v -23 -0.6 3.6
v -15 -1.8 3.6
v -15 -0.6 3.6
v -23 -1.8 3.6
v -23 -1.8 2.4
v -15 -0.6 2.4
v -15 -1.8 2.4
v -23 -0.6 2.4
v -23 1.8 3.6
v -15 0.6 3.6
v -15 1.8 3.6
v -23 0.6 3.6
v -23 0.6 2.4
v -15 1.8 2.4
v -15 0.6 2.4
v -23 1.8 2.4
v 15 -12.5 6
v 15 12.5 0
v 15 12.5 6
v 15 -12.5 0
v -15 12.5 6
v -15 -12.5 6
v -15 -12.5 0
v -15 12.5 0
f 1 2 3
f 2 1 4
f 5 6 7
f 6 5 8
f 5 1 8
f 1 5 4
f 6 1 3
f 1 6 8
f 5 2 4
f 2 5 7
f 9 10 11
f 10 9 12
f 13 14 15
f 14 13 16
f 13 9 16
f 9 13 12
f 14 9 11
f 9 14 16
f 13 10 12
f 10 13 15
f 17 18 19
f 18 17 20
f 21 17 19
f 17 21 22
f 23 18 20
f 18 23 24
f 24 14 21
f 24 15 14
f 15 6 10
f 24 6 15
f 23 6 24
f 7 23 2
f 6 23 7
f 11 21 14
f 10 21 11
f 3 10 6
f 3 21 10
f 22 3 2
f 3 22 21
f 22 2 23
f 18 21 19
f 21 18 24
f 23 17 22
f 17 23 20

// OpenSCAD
// file: ../lipo-cradle.scad
//-----------------------------------------------------------------------
// LiPo pouch cell, in a low open cradle on the floor
//
// A low wall round the pack's footprint, with a gap on one side for the
// lead. The pack drops in and the lid (or a strap) keeps it down. Optional
// strap bars on the two long sides take a hook-and-loop strap over the pack:
// the strap goes down outside the wall, under the bar, and back up.
//
// Modules, all in the same frame:
//   lipoGhost()    the pack, for previews
//   lipoCradle()   the plastic: wall, lead gap, optional strap bars
//   lipoBody()     the pack as a plain solid (views, collision checks)
//
// Frame: origin on the floor top, at the centre of the pack's footprint.
// X along the pack's length (the tab and lead at -X), Y across its width,
// Z up. Units: mm.
//
// Sizes: the pouch code on the label, TTWWLL = thickness in tenths of a mm,
// width, length in whole mm (602530 = 6.0 x 25 x 30). Named packs are in
// lipoPacks; lipoCodeDims("503035") decodes any other code. Codes are the
// CELL: a pack with its protection board folded at the tab end is a few mm
// longer, and pouches swell, so measure the pack and use the allowances.
//
// Use with `use <.../components/lipo-cradle/lipo-cradle.scad>`.
//-----------------------------------------------------------------------

//-- [name, thickness, width, length, note]. The cell sizes from the code, except where measured
lipoPacks = [
  ["402030",  4.0, 20, 30, ""],
  ["502030",  5.0, 20, 30, ""],
  ["602530",  6.0, 25, 30, "500 mAh in use, controller project (label read 2026-10-30)"],
  ["503035",  5.0, 30, 35, ""],
  ["403048",  4.0, 30, 48, ""],
  ["603048",  6.0, 30, 48, ""],
  ["503450",  5.0, 34, 50, ""],
  ["603450",  6.0, 34, 50, ""],
  ["103450", 10.0, 34, 50, "the 10 is whole mm: 1800-2000 mAh"],
  ["902030",  9.0, 20, 30, ""],
  ["605060",  6.0, 50, 60, ""],
  ["803860",  8.0, 38, 60, "2000 mAh class"],
  ["PKCell-2000", 8.0, 38, 60, "Pi Hut 105187, 2000 mAh, vendor size; lead 100, JST-PH"],
];

//-- decode a six-digit code: TT in tenths of a mm (20 and up), WW, LL in mm.
//-- Codes starting with 1 (10-19) are ambiguous (103450 is 10 mm thick): put them in lipoPacks
function lipoCodeDims(code) =
  let (d = [for (c = code) ord(c) - 48],
       t = d[0]*10 + d[1])
  assert(len(code) == 6 && min(d) >= 0 && max(d) <= 9, str("not a six-digit pouch code: ", code))
  assert(t >= 20, str("ambiguous thickness in ", code, ": add it to lipoPacks"))
  [t/10, d[2]*10 + d[3], d[4]*10 + d[5]];

//-- [thickness, width, length] by name, or decoded from the code
function lipoDims(name) = let (i = search([name], lipoPacks)[0])
  (i != [] && i != undef) ? [lipoPacks[i][1], lipoPacks[i][2], lipoPacks[i][3]] : lipoCodeDims(name);

lipoDefault    = "602530";

//-- The cradle
lipoClearance  = 0.4;     // each side, pack to wall (controller base fitClearance). CAL by the fit piece
lipoWall       = 1.6;
lipoWallH      = 4;       // above the floor (controller base: 4 for a 6 thick pack)
lipoLeadGap    = 12;      // gap in the wall for the lead (controller base: 12)
lipoPcmAllow   = 0;       // added to the length at the tab end, for a protection board past the cell: CAL
lipoSwell      = 0.10;    // allow 10 % on the thickness for a pouch swelling with age
lipoTopGap     = 0.5;     // above the swollen pack, under the lid
//-- strap bars: off unless strap > 0 (the strap's width)
lipoStrapGap   = 2.0;     // wall to bar, and floor to bar: room for the strap
lipoStrapBar   = 2.0;     // bar thickness (Y) and height (Z)
lipoStrapPost  = 2.0;     // posts each end of the bar

//-- headroom over the floor the lid must clear
function lipoHeadroom(name = lipoDefault, swell = lipoSwell) = lipoDims(name)[0]*(1 + swell) + lipoTopGap;

module lipoBody(name = lipoDefault, pcm = lipoPcmAllow)
{
  d = lipoDims(name);
  translate([-d[2]/2 - pcm, -d[1]/2, 0]) cube([d[2] + pcm, d[1], d[0]]);
}

module lipoGhost(name = lipoDefault, pcm = lipoPcmAllow)
{
  d = lipoDims(name);
  %color("Silver") lipoBody(name, pcm);
  //-- the lead, out of the tab end
  for (s = [-1, 1])
    %color(s < 0 ? "Black" : "Red") translate([-d[2]/2 - pcm - 15, s*1.2 - 0.6, d[0]/2 - 0.6]) cube([15, 1.2, 1.2]);
}

//-- leadSide: "-x" (default, the tab end), "+x", "-y", "+y". strap: strap width, 0 for none
module lipoCradle(name = lipoDefault, clearance = lipoClearance, h = lipoWallH, leadSide = "-x",
                  gap = lipoLeadGap, pcm = lipoPcmAllow, strap = 0)
{
  d = lipoDims(name);
  lx = d[2] + pcm; ly = d[1];
  x0 = -d[2]/2 - pcm;                                    // pack's -X end
  c = clearance; w = lipoWall;
  assert(gap < min(lx, ly) - 2, "lead gap wider than the side it's in");
  translate([0, 0, -0.01])
    difference()
    {
      translate([x0 - c - w, -ly/2 - c - w, 0]) cube([lx + 2*(c + w), ly + 2*(c + w), h + 0.01]);
      translate([x0 - c, -ly/2 - c, -1]) cube([lx + 2*c, ly + 2*c, h + 2]);
      //-- lead gap, centred on its side
      if (leadSide == "-x") translate([x0 - c - w - 1, -gap/2, -1]) cube([w + 2, gap, h + 2]);
      if (leadSide == "+x") translate([x0 + lx + c - 1, -gap/2, -1]) cube([w + 2, gap, h + 2]);
      if (leadSide == "-y") translate([x0 + lx/2 - gap/2, -ly/2 - c - w - 1, -1]) cube([gap, w + 2, h + 2]);
      if (leadSide == "+y") translate([x0 + lx/2 - gap/2, ly/2 + c - 1, -1]) cube([gap, w + 2, h + 2]);
    }
  //-- strap bars on the long sides, across the middle of the pack
  if (strap > 0)
    for (m = [0, 1])
      mirror([0, m, 0])
        translate([x0 + lx/2, ly/2 + c + w + lipoStrapGap, -0.01])
          difference()
          {
            translate([-strap/2 - 0.5 - lipoStrapPost, 0, 0])
              cube([strap + 1 + 2*lipoStrapPost, lipoStrapBar, lipoStrapGap + lipoStrapBar + 0.01]);
            translate([-strap/2 - 0.5, -1, -1]) cube([strap + 1, lipoStrapBar + 2, lipoStrapGap + 1.01]);
          }
}
// main file
// The pack as a solid, for the catalogue (the Ghost is % so it never renders).
// n = 4 sets them out as on the fit piece.
use <../lipo-cradle.scad>

name = "602530";
pcm  = 0;
n    = 1;
d  = lipoDims(name);
lx = d[2] + pcm; ly = d[1];
out = 0.6 + 1.6;
px = lx + 2*out + 8;
py = ly + 2*(out + 2 + 2) + 4;
pos = [[0, 0], [px, 0], [0, py], [px, py]];

for (i = [0 : n - 1])
  translate([pos[i][0], pos[i][1], 0])
  {
    lipoBody(name, pcm);
    //-- the lead, out of the tab end
    for (s = [-1, 1]) translate([-d[2]/2 - pcm - 8, s*1.2 - 0.6, d[0]/2 - 0.6]) cube([8.01, 1.2, 1.2]);
  }
